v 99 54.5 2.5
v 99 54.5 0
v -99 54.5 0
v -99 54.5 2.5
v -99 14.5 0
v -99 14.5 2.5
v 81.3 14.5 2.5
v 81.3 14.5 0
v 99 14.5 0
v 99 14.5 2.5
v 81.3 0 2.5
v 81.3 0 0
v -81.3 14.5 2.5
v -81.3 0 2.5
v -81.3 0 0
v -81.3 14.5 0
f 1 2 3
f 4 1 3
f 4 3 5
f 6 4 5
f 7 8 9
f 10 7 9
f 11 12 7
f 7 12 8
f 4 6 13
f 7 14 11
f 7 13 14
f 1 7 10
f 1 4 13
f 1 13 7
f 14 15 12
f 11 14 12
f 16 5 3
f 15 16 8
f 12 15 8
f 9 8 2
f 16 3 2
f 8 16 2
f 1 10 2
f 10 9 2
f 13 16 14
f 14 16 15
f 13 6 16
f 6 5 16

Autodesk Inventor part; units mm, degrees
ref_plane "YZ Plane" through (0, 0, 0) normal (1, 0, 0) x (0, 1, 0)
ref_plane "XZ Plane" through (0, 0, 0) normal (0, 1, 0) x (-1, 0, 0)
ref_plane "XY Plane" through (0, 0, 0) normal (0, 0, 1) x (1, 0, 0)
sketch "スケッチ1" plane through (0, 0, 0) normal (0, 0, 1) x (1, 0, 0)
  line L0 (-81.3, 0) -> (81.3, 0)
  line L1 (81.3, 0) -> (81.3, 14.5)
  line L2 (81.3, 14.5) -> (-81.3, 14.5)
  line L3 (-81.3, 14.5) -> (-81.3, 0)
  line L4 (-99, 14.5) -> (99, 14.5)
  line L5 (99, 14.5) -> (99, 54.5)
  line L6 (99, 54.5) -> (-99, 54.5)
  line L7 (-99, 54.5) -> (-99, 14.5)
  point P0 (0, 0)
  point P1 (0, 0)
  point P2 (0, 14.5)
  point P3 (-81.3, 14.5)
  point P4 (81.3, 14.5)
  dimension "d0" = 162.6
  dimension "d1" = 14.5
  dimension "d2" = 198
  dimension "d3" = 40
extrude "押し出し1" add sketch "スケッチ1" along normal blind 2.5
properties part number "wall" material "木材 (カエデ材)"
